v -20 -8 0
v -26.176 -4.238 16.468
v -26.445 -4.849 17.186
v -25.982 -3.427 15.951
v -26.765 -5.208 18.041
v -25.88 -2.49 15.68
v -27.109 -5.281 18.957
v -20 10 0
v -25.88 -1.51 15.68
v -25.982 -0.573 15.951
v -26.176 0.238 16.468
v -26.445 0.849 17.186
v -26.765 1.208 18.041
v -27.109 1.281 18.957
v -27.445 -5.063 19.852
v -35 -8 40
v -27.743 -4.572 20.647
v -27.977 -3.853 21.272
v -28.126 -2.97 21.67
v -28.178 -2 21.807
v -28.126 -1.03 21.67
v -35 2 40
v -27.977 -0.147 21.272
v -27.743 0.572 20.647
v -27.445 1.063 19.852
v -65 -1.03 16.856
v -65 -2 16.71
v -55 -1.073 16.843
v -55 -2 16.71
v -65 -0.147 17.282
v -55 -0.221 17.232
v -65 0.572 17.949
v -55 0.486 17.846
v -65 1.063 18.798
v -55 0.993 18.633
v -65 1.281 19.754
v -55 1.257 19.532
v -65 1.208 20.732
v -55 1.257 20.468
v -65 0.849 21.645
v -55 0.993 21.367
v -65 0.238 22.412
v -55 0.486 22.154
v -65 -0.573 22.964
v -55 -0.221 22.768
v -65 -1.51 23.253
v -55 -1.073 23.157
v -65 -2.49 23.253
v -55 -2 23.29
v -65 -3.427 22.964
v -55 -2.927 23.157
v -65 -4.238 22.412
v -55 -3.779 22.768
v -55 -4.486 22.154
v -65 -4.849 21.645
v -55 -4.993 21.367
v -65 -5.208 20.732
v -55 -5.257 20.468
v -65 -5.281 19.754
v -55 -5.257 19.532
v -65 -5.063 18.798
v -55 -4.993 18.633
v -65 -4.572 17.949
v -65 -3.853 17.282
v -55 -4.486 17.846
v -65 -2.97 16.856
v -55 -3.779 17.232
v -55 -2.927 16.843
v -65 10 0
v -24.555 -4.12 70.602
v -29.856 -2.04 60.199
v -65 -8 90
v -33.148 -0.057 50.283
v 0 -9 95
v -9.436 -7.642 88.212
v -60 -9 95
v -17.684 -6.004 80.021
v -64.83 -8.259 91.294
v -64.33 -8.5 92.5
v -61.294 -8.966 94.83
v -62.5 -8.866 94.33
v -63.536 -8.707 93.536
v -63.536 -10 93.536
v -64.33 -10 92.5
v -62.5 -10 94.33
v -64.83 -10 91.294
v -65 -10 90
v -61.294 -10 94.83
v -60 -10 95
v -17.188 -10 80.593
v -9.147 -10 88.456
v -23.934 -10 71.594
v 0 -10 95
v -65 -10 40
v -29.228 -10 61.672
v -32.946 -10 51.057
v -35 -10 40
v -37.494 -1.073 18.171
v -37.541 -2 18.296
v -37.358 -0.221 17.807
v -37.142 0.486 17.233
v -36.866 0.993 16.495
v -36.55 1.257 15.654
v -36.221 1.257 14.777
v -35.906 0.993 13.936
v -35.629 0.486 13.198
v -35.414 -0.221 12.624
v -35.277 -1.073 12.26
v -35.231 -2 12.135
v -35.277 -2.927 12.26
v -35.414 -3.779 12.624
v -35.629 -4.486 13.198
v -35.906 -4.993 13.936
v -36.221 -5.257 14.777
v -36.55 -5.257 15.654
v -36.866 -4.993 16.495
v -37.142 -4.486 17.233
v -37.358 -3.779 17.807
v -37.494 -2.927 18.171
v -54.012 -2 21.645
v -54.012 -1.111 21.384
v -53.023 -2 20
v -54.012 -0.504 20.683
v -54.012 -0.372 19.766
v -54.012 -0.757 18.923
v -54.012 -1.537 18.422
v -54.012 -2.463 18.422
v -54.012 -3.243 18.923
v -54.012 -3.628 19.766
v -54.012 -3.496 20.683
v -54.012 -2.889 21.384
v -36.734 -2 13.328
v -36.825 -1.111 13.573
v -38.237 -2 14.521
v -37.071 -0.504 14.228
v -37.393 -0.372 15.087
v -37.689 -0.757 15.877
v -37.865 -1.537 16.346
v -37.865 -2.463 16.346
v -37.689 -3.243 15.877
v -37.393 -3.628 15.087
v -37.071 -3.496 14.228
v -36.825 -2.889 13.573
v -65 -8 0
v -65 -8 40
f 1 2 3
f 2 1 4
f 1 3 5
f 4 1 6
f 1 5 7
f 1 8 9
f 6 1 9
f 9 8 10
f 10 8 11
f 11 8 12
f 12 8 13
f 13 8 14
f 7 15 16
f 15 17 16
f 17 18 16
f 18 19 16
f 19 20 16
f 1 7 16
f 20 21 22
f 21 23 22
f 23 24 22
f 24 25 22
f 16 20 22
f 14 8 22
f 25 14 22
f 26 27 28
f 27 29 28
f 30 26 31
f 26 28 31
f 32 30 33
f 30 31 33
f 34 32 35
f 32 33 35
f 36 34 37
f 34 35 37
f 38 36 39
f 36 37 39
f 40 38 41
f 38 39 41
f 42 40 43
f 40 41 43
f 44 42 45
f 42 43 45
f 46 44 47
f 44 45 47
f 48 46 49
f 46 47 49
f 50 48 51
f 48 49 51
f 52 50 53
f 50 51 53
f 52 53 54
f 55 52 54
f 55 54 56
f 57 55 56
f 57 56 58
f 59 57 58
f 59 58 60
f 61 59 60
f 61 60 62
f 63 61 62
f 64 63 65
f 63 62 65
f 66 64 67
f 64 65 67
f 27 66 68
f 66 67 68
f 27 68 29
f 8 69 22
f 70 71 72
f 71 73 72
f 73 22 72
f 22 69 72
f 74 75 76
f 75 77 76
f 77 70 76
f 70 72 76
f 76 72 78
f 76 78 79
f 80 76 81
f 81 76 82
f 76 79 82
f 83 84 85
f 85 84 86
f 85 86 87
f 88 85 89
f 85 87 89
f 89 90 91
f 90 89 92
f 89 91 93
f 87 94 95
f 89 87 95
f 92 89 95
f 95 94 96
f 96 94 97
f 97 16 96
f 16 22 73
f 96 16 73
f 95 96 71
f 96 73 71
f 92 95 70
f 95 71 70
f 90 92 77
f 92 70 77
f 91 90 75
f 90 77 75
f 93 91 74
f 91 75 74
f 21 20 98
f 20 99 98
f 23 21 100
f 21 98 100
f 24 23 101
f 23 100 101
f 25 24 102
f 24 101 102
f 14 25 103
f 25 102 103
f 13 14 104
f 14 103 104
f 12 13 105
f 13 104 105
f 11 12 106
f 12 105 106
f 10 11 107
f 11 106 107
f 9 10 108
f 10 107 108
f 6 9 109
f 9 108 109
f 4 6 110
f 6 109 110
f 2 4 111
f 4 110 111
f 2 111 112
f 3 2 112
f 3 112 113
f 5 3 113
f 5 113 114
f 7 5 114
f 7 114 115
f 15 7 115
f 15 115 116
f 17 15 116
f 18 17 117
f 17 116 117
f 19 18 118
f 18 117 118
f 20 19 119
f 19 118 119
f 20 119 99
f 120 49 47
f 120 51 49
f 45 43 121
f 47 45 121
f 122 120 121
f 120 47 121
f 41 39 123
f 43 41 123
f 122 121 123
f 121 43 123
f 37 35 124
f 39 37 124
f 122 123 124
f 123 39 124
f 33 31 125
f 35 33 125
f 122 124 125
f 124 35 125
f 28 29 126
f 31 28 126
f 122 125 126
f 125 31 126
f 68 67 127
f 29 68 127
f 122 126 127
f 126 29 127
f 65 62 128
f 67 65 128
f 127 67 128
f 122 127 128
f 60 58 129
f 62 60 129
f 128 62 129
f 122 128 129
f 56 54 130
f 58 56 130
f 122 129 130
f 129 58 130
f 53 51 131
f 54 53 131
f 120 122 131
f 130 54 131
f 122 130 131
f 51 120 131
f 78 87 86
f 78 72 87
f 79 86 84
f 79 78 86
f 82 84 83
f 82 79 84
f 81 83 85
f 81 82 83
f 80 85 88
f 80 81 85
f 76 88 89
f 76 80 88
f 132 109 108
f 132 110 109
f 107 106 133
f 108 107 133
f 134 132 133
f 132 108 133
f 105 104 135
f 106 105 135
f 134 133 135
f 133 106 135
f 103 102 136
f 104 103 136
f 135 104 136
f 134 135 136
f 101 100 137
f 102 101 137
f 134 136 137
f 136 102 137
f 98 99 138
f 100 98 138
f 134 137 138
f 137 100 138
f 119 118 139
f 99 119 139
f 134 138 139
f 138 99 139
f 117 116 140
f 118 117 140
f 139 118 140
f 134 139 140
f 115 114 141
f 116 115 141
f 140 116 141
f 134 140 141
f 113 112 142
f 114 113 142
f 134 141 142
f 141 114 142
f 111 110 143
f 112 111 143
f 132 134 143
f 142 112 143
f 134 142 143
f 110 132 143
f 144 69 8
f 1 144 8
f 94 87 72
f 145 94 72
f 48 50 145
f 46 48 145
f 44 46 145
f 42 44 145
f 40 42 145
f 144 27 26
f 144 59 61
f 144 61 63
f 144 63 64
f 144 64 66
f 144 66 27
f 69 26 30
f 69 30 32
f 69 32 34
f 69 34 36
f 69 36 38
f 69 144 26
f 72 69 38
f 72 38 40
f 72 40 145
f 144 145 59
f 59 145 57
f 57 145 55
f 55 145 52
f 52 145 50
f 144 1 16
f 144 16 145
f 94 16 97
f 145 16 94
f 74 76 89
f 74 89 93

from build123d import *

# Parameters (mm, degrees)
ESBO_O1_W                                      = 130
ESBO_O1_H                                      = 20
RESSALTO_EXTRUS_O1_DEPTH                       = 95
CORTE_EXTRUS_O2_REACH                          = 22
CORTE_EXTRUS_O4_DEPTH                          = 1
CORTE_EXTRUS_O4_DEPTH_BACK                     = 66
BROCA_DE_ROSQUEAR_DE_CANO_PARA_TARRAXA_D_D     = 6.579997
BROCA_DE_ROSQUEAR_DE_CANO_PARA_TARRAXA_D_DEPTH = 10
BROCA_DE_ROSQUEAR_DE_CANO_PARA_TARRAXA_D_TIP   = 1.976830535
BROCA_DE_ROSQUEAR_DE_CANO_PARA_TARRA_2_D       = 6.579997
BROCA_DE_ROSQUEAR_DE_CANO_PARA_TARRA_2_DEPTH   = 10
BROCA_DE_ROSQUEAR_DE_CANO_PARA_TARRA_2_TIP     = 1.976830535
FILETE2_R                                      = 5
ESBO_O38_W                                     = 45
ESBO_O38_H                                     = 2
CORTE_EXTRUS_O9_DEPTH                          = 40


with BuildPart() as part:
    # Esboço1 → Ressalto-extrusão1 (new body)
    with BuildSketch(Plane.XY):
        Rectangle(ESBO_O1_W, ESBO_O1_H)
    extrude(amount=RESSALTO_EXTRUS_O1_DEPTH)

    # Esboço2 → Corte-extrusão2 (cut, up to next)
    with BuildSketch(Plane(origin=(0, 10, 0), x_dir=(1, 0, 0), z_dir=(0, 1, 0)), mode=Mode.PRIVATE) as corte_extrus_o2_sk1:
        with BuildLine():
            Line((65, 0), (-20, 0))
            Line((-20, 0), (-35, -40))
            ThreePointArc((-35, -40), (-23.93419305, -71.594486486), (0, -95))
            Line((0, -95), (65, -95))
            Line((65, -95), (65, 0))
        make_face()
    corte_extrus_o2_tool1 = extrude(corte_extrus_o2_sk1.sketch, amount=-CORTE_EXTRUS_O2_REACH, mode=Mode.PRIVATE) & part.part
    add(corte_extrus_o2_tool1.solids().sort_by_distance((19.507418, 10, 46.266943))[0], mode=Mode.SUBTRACT)

    # Esboço13 → Corte-extrusão4 (cut, two sides)
    with BuildSketch(Plane.ZY.offset(65)) as corte_extrus_o4_sk:
        Polygon((-200.200134404, 50.040026881), (0, 10), (95, -9), (295.200134404, -49.040026881), (375.280188165, 351.360241926), (-120.120080642, 450.440295688), align=None)
    extrude(amount=CORTE_EXTRUS_O4_DEPTH, mode=Mode.SUBTRACT)
    extrude(corte_extrus_o4_sk.sketch, amount=-CORTE_EXTRUS_O4_DEPTH_BACK, mode=Mode.SUBTRACT)

    # Broca de rosquear de cano para tarraxa d
    with Locations(Plane.ZY.offset(65)):
        with Locations((20, -2)):
            Hole(BROCA_DE_ROSQUEAR_DE_CANO_PARA_TARRAXA_D_D / 2, depth=BROCA_DE_ROSQUEAR_DE_CANO_PARA_TARRAXA_D_DEPTH)
            with Locations((0, 0, -(BROCA_DE_ROSQUEAR_DE_CANO_PARA_TARRAXA_D_DEPTH + BROCA_DE_ROSQUEAR_DE_CANO_PARA_TARRAXA_D_TIP / 2))):  # 118° drill point
                Cone(0, BROCA_DE_ROSQUEAR_DE_CANO_PARA_TARRAXA_D_D / 2, BROCA_DE_ROSQUEAR_DE_CANO_PARA_TARRAXA_D_TIP, mode=Mode.SUBTRACT)

    # Broca de rosquear de cano para tarra 2
    with Locations(Plane(origin=(-17.534246575, 0, -6.575342466), x_dir=(0.351123442, 0, -0.936329178), z_dir=(0.936329178, 0, 0.351123442))):
        with Locations((-27.022468832, -2)):
            Hole(BROCA_DE_ROSQUEAR_DE_CANO_PARA_TARRA_2_D / 2, depth=BROCA_DE_ROSQUEAR_DE_CANO_PARA_TARRA_2_DEPTH)
            with Locations((0, 0, -(BROCA_DE_ROSQUEAR_DE_CANO_PARA_TARRA_2_DEPTH + BROCA_DE_ROSQUEAR_DE_CANO_PARA_TARRA_2_TIP / 2))):  # 118° drill point
                Cone(0, BROCA_DE_ROSQUEAR_DE_CANO_PARA_TARRA_2_D / 2, BROCA_DE_ROSQUEAR_DE_CANO_PARA_TARRA_2_TIP, mode=Mode.SUBTRACT)

    # Filete2
    filete2_edges = [part.edges().sort_by_distance(p)[0] for p in [
        (-65, -9.5, 95),
    ]]
    fillet(filete2_edges, radius=FILETE2_R)

    # Esboço38 → Corte-extrusão9 (cut)
    with BuildSketch(Plane(origin=(0, 0, 0), x_dir=(-1, 0, 0), z_dir=(0, 0, -1))):
        with Locations((42.5, -9)):
            Rectangle(ESBO_O38_W, ESBO_O38_H)
    extrude(amount=-CORTE_EXTRUS_O9_DEPTH, mode=Mode.SUBTRACT)


solid = part.part
